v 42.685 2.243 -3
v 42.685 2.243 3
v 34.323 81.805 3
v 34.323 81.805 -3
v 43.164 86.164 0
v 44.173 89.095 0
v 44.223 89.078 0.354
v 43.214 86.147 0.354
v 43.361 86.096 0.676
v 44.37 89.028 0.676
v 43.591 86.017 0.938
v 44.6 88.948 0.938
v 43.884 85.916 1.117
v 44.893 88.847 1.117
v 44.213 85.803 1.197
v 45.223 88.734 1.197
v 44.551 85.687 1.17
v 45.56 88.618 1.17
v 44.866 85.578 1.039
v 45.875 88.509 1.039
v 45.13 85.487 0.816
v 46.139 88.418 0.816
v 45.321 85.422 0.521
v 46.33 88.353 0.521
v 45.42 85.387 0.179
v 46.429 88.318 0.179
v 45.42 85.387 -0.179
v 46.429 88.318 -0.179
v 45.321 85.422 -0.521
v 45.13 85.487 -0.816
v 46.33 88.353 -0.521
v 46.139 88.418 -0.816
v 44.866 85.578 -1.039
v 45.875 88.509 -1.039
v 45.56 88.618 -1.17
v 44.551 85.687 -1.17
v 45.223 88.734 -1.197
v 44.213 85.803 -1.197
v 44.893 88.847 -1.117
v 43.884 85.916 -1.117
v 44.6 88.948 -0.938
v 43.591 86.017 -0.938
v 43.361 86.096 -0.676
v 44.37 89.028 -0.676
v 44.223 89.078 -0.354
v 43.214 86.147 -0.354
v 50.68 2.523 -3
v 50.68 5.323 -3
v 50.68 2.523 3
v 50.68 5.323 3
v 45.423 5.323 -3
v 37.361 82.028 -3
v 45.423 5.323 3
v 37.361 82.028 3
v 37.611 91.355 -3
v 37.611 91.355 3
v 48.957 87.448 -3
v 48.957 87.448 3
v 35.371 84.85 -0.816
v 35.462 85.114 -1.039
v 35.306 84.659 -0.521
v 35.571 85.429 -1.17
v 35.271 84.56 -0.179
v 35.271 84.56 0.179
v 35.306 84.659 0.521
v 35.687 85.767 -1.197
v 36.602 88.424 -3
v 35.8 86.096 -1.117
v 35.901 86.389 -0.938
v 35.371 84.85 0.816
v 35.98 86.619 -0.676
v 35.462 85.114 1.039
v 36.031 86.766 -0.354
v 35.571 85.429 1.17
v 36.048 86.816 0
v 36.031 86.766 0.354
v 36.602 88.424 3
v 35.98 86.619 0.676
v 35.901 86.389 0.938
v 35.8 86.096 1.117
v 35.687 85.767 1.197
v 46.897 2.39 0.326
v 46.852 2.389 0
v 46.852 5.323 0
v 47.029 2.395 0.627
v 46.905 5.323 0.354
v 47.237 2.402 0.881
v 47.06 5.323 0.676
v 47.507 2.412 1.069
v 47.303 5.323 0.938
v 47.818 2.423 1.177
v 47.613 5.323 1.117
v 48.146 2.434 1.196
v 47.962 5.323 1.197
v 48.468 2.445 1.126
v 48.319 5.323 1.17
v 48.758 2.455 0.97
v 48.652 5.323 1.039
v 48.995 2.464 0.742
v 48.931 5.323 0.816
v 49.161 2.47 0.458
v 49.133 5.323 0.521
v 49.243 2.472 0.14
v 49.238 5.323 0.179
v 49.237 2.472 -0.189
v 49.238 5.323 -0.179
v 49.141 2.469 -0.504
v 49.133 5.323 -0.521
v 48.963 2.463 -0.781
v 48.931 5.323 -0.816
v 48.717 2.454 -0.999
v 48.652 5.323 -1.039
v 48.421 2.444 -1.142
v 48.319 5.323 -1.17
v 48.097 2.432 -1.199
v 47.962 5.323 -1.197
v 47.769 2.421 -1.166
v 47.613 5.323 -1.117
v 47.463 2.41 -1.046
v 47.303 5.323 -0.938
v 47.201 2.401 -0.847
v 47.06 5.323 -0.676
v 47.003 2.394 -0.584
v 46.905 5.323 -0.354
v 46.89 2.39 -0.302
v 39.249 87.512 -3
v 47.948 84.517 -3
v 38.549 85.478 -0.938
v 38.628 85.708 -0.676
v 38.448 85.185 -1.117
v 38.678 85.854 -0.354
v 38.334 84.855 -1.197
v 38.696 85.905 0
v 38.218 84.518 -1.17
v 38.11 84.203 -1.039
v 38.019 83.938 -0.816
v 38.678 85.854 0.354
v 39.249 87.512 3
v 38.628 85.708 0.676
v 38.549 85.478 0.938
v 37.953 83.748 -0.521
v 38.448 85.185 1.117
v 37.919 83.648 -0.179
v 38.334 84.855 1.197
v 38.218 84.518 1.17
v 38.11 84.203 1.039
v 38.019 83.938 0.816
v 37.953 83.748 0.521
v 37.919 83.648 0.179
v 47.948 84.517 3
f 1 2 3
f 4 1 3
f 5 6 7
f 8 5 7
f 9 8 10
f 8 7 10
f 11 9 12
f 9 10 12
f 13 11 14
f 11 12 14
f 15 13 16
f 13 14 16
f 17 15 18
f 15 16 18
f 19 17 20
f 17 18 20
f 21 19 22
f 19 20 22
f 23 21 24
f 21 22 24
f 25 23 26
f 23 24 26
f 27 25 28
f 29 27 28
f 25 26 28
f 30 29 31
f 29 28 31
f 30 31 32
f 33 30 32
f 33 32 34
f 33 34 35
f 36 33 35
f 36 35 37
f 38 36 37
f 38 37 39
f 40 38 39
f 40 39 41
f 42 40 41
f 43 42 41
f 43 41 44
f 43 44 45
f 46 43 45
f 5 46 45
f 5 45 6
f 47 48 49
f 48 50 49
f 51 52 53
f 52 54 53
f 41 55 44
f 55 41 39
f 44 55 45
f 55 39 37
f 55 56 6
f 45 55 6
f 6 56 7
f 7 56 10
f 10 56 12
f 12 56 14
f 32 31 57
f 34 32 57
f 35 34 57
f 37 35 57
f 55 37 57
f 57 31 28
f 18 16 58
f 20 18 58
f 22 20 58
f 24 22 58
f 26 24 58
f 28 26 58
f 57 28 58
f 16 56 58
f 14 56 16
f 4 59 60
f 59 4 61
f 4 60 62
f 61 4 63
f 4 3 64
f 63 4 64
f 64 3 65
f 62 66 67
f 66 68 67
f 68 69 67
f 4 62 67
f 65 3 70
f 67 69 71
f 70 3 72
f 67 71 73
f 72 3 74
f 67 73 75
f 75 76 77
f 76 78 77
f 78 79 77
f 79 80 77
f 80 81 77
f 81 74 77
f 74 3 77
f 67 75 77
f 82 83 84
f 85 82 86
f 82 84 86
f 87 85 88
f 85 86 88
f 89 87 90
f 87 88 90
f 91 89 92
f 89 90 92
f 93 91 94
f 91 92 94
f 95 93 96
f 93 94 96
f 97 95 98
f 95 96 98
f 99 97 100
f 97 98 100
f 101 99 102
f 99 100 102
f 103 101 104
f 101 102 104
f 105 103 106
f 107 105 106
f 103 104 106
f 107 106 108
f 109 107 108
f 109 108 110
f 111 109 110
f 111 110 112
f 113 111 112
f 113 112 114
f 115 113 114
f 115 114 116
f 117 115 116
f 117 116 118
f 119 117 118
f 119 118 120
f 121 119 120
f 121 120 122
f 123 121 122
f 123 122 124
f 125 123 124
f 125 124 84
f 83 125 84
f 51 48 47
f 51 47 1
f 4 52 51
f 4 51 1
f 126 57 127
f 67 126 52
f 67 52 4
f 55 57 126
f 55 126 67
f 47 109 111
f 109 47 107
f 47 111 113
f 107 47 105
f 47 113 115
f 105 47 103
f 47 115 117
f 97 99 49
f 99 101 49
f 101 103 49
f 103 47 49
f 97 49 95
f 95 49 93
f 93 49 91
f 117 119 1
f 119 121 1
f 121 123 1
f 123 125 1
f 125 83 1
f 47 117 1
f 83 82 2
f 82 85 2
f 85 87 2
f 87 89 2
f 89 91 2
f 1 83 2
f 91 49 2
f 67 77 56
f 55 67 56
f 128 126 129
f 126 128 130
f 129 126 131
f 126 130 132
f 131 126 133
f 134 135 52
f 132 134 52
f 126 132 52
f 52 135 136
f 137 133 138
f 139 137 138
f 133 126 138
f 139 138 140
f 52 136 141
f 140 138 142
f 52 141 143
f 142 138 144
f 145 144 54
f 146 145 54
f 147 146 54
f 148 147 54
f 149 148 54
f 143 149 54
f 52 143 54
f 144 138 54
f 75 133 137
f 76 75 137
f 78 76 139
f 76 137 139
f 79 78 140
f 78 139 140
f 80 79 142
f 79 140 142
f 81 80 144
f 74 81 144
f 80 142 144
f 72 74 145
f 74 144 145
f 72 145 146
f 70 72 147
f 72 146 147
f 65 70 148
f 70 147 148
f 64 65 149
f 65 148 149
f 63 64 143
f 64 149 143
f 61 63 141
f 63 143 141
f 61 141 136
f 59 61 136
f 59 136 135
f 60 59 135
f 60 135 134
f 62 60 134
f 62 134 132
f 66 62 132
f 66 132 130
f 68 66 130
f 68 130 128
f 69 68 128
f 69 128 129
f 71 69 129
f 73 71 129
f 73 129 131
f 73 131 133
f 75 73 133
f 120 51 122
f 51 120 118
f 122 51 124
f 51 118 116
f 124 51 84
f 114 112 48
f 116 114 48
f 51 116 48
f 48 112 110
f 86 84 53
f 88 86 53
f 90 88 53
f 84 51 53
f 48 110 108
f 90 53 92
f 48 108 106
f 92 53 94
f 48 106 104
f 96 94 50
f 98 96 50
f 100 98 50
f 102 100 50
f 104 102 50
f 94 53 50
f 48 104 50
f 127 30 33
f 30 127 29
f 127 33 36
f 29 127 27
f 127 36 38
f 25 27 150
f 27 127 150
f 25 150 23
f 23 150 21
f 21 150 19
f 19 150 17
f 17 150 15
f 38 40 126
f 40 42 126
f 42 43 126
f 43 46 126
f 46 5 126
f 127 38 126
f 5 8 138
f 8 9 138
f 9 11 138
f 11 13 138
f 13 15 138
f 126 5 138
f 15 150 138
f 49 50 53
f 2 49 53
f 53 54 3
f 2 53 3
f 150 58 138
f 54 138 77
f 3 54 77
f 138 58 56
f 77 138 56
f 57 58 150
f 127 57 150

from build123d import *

# Parameters (mm, degrees)
SALIENTE_EXTRUIR1_DEPTH = 3
CORTAR_EXTRUIR1_REACH   = 102.701
CROQUIS2_R              = 1.2
CORTAR_EXTRUIR2_REACH   = 99.382
CROQUIS3_R              = 1.2
SALIENTE_EXTRUIR2_DEPTH = 6
CORTAR_EXTRUIR3_REACH   = 94.93
CROQUIS5_R              = 1.2


with BuildPart() as part:
    # Croquis1 → Saliente-Extruir1 (new, symmetric)
    with BuildSketch(Plane.XY):
        Polygon((36.601721277, 88.42375405), (39.249173289, 87.512163218), (37.360877993, 82.028155479), (45.422960067, 5.322568365), (50.680147873, 5.322568365), (50.680147873, 2.522568365), (42.685021257, 2.243372391), (34.322744196, 81.805124021), align=None)
    extrude(amount=SALIENTE_EXTRUIR1_DEPTH, both=True)

    # Croquis2 → Cortar-Extruir1 (cut, up to next)
    with BuildSketch(Plane(origin=(8.150038197, -2.806283201, 0), x_dir=(0, 0, -1), z_dir=(0.9455185755993173, -0.3255681544571552, 0)), mode=Mode.PRIVATE) as cortar_extruir1_sk1:
        with Locations(Location((0, 92.622656825, 0), (0, 0, 90))):
            Circle(CROQUIS2_R)
    cortar_extruir1_tool1 = extrude(cortar_extruir1_sk1.sketch, amount=-CORTAR_EXTRUIR1_REACH, mode=Mode.PRIVATE) & part.part
    add(cortar_extruir1_tool1.solids().sort_by_distance((38.305026, 84.770159, 0))[0], mode=Mode.SUBTRACT)

    # Cortar-Extruir2: up to this plane
    cortar_extruir2_end = Plane(origin=(42.685021257, 2.243372391, 3), z_dir=(-0.03489949670250159, 0.9993908270190958, 0))
    # Croquis3 → Cortar-Extruir2 (cut, up to the surface)
    with BuildSketch(Plane(origin=(0, 5.322568365, 0), x_dir=(1, 0, 0), z_dir=(0, 1, 0)), mode=Mode.PRIVATE) as cortar_extruir2_sk1:
        with Locations(Location((48.05155397, 0, 0), (0, 0, 180))):
            Circle(CROQUIS3_R)
    cortar_extruir2_tool1 = split(extrude(cortar_extruir2_sk1.sketch, amount=-CORTAR_EXTRUIR2_REACH, mode=Mode.PRIVATE), bisect_by=cortar_extruir2_end, keep=Keep.BOTH, mode=Mode.PRIVATE)
    add(cortar_extruir2_tool1.solids().sort_by_distance((48.051554, 5.322568, 0))[0], mode=Mode.SUBTRACT)

    # Croquis4 → Saliente-Extruir2 (add)
    with BuildSketch(Plane.XY.offset(3)):
        Polygon((36.601721277, 88.42375405), (37.610982556, 91.354861634), (48.957205463, 87.448043781), (47.947944184, 84.516936196), align=None)
    extrude(amount=-SALIENTE_EXTRUIR2_DEPTH)

    # Croquis5 → Cortar-Extruir3 (cut, up to next)
    with BuildSketch(Plane(origin=(32.10839637, 93.249554003, 0), x_dir=(0.9455185755993183, -0.3255681544571526, 0), z_dir=(0.3255681544571526, 0.9455185755993183, 0)), mode=Mode.PRIVATE) as cortar_extruir3_sk1:
        with Locations(Location((13.95964895, 0, 0), (0, 0, 180))):
            Circle(CROQUIS5_R)
    cortar_extruir3_tool1 = extrude(cortar_extruir3_sk1.sketch, amount=-CORTAR_EXTRUIR3_REACH, mode=Mode.PRIVATE) & part.part
    add(cortar_extruir3_tool1.solids().sort_by_distance((45.307504, 88.704737, 0))[0], mode=Mode.SUBTRACT)


solid = part.part
